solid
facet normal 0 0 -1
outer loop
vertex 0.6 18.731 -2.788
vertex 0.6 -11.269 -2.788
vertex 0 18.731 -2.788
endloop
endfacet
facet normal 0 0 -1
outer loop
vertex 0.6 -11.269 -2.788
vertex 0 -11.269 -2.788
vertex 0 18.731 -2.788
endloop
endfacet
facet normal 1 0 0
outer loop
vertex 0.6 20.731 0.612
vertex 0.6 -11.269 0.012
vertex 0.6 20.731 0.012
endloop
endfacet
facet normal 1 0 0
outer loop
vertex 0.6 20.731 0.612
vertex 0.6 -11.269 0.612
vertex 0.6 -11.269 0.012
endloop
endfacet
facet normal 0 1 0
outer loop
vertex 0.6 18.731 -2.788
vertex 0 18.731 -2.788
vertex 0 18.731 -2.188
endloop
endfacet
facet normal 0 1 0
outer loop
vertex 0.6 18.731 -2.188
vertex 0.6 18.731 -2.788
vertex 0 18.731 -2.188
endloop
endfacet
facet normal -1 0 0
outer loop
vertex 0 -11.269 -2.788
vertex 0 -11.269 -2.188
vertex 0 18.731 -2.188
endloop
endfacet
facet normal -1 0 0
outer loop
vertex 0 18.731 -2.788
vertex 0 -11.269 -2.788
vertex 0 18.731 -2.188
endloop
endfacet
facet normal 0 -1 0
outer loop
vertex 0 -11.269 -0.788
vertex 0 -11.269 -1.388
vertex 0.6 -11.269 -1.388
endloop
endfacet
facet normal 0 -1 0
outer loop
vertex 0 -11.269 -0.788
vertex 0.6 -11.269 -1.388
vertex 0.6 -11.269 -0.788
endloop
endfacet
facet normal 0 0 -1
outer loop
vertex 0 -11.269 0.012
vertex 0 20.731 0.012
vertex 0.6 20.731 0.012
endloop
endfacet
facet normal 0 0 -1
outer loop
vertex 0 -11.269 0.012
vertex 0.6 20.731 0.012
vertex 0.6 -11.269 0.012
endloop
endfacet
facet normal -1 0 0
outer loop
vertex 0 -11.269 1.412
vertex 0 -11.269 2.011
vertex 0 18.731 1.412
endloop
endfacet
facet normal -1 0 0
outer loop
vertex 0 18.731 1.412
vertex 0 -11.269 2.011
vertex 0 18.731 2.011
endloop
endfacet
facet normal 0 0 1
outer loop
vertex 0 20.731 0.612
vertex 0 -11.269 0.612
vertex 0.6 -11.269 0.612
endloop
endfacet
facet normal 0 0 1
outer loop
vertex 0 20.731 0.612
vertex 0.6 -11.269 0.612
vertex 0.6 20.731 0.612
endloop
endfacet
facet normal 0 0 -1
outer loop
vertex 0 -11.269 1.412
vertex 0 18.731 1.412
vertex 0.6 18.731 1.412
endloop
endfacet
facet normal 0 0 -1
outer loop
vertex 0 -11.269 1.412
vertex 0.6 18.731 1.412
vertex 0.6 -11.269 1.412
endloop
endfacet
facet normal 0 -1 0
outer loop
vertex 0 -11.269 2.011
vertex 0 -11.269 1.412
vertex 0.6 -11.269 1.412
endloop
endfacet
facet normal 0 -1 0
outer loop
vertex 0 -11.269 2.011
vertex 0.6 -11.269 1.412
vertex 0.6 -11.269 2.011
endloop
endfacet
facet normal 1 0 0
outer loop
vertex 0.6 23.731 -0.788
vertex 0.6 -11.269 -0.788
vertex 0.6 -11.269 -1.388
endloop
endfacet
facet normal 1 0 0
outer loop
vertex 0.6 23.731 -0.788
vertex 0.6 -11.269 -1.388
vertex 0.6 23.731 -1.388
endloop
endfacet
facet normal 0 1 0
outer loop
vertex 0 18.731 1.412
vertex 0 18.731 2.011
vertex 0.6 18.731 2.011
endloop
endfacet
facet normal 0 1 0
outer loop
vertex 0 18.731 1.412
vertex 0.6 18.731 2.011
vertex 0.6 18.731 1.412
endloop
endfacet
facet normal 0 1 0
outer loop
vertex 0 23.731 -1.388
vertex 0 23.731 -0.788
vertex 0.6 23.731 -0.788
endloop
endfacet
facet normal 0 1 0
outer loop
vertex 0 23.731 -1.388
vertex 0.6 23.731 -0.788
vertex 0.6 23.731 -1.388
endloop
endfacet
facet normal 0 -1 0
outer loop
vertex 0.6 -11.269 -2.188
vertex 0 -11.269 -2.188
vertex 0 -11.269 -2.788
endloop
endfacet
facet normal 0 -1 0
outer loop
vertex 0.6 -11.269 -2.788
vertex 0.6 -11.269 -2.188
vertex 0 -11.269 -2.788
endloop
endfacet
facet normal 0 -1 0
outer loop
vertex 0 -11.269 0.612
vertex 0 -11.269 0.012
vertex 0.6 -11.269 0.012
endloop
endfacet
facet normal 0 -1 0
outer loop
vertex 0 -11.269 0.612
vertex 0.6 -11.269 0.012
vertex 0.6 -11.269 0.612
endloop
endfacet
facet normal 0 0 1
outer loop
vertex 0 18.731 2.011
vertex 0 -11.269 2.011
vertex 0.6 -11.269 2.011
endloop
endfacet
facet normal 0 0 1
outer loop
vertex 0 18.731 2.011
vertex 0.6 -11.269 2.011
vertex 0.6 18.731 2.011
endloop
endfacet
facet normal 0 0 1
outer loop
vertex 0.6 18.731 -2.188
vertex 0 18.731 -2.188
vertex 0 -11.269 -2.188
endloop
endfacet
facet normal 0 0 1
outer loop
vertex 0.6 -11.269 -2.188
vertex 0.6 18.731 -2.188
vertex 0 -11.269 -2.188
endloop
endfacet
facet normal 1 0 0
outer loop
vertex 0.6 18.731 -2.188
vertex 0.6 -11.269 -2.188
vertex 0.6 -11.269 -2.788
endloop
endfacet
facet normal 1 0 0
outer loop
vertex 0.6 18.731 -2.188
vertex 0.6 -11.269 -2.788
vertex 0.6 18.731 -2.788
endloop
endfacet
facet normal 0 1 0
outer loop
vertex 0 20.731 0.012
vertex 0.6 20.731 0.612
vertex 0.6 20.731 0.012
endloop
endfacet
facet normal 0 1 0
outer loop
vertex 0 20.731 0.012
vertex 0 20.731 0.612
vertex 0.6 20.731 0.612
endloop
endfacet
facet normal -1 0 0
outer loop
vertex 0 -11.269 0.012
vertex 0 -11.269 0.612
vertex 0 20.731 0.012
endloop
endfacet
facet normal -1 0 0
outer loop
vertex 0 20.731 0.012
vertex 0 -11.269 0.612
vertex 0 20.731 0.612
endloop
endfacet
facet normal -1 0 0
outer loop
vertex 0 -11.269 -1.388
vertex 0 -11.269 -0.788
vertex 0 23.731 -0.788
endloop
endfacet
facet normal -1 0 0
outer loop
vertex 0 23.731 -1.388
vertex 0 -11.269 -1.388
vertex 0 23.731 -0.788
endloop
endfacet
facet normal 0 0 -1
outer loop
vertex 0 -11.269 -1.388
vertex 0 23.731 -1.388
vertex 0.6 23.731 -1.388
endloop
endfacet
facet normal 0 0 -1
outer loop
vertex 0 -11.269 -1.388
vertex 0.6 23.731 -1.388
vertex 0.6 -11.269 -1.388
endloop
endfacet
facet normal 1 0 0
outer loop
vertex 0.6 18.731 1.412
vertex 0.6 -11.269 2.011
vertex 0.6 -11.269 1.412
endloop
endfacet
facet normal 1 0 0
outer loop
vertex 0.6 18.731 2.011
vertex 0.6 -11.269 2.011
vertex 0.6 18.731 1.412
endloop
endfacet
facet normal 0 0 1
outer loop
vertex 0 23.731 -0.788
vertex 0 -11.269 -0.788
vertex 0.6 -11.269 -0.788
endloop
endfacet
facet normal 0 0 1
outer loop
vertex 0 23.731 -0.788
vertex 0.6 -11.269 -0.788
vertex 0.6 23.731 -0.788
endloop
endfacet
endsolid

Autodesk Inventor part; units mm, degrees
ref_plane "YZ Plane" through (0, 0, 0) normal (1, 0, 0) x (0, 1, 0)
ref_plane "XZ Plane" through (0, 0, 0) normal (0, 1, 0) x (-1, 0, 0)
ref_plane "XY Plane" through (0, 0, 0) normal (0, 0, 1) x (1, 0, 0)
sketch "Skizze1" plane through (0, 0, 0) normal (1, 0, 0) x (0, 1, 0)
  line L0 (-11.2692, -2.1885) -> (-11.2692, -2.7885)
  line L1 (-11.2692, -2.7885) -> (18.7308, -2.7885)
  line L2 (18.7308, -2.7885) -> (18.7308, -2.1885)
  line L3 (18.7308, -2.1885) -> (-11.2692, -2.1885)
  line L4 (23.7308, -1.3885) -> (-11.2692, -1.3885)
  line L5 (-11.2692, -1.3885) -> (-11.2692, -0.7885)
  line L6 (-11.2692, -0.7885) -> (23.7308, -0.7885)
  line L7 (23.7308, -0.7885) -> (23.7308, -1.3885)
  line L8 (-11.2692, 0.0115) -> (-11.2692, 0.6115)
  line L9 (-11.2692, 0.6115) -> (20.7308, 0.6115)
  line L10 (20.7308, 0.6115) -> (20.7308, 0.0115)
  line L11 (20.7308, 0.0115) -> (-11.2692, 0.0115)
  line L12 (-11.2692, 0.8555) -> (-11.2692, 2.0115)
  line L13 (-11.2692, 2.0115) -> (18.7308, 2.0115)
  line L14 (18.7308, 2.0115) -> (18.7308, 1.4115)
  line L15 (18.7308, 1.4115) -> (-11.2692, 1.4115)
  point P0 (0, 0)
  dimension "d0" = 0.6
  dimension "d1" = 30
  dimension "d2" = 0.6
  dimension "d3" = 35
  dimension "d4" = 0.8
  dimension "d5" = 0.6
  dimension "d6" = 32
  dimension "d7" = 0.6
  dimension "d8" = 30
  dimension "d9" = 0.8
  dimension "d10" = 0.8
extrude "Extrusion1" add sketch "Skizze1" along normal blind 0.6
properties part number "Legs" material "Aluminium 6061"
